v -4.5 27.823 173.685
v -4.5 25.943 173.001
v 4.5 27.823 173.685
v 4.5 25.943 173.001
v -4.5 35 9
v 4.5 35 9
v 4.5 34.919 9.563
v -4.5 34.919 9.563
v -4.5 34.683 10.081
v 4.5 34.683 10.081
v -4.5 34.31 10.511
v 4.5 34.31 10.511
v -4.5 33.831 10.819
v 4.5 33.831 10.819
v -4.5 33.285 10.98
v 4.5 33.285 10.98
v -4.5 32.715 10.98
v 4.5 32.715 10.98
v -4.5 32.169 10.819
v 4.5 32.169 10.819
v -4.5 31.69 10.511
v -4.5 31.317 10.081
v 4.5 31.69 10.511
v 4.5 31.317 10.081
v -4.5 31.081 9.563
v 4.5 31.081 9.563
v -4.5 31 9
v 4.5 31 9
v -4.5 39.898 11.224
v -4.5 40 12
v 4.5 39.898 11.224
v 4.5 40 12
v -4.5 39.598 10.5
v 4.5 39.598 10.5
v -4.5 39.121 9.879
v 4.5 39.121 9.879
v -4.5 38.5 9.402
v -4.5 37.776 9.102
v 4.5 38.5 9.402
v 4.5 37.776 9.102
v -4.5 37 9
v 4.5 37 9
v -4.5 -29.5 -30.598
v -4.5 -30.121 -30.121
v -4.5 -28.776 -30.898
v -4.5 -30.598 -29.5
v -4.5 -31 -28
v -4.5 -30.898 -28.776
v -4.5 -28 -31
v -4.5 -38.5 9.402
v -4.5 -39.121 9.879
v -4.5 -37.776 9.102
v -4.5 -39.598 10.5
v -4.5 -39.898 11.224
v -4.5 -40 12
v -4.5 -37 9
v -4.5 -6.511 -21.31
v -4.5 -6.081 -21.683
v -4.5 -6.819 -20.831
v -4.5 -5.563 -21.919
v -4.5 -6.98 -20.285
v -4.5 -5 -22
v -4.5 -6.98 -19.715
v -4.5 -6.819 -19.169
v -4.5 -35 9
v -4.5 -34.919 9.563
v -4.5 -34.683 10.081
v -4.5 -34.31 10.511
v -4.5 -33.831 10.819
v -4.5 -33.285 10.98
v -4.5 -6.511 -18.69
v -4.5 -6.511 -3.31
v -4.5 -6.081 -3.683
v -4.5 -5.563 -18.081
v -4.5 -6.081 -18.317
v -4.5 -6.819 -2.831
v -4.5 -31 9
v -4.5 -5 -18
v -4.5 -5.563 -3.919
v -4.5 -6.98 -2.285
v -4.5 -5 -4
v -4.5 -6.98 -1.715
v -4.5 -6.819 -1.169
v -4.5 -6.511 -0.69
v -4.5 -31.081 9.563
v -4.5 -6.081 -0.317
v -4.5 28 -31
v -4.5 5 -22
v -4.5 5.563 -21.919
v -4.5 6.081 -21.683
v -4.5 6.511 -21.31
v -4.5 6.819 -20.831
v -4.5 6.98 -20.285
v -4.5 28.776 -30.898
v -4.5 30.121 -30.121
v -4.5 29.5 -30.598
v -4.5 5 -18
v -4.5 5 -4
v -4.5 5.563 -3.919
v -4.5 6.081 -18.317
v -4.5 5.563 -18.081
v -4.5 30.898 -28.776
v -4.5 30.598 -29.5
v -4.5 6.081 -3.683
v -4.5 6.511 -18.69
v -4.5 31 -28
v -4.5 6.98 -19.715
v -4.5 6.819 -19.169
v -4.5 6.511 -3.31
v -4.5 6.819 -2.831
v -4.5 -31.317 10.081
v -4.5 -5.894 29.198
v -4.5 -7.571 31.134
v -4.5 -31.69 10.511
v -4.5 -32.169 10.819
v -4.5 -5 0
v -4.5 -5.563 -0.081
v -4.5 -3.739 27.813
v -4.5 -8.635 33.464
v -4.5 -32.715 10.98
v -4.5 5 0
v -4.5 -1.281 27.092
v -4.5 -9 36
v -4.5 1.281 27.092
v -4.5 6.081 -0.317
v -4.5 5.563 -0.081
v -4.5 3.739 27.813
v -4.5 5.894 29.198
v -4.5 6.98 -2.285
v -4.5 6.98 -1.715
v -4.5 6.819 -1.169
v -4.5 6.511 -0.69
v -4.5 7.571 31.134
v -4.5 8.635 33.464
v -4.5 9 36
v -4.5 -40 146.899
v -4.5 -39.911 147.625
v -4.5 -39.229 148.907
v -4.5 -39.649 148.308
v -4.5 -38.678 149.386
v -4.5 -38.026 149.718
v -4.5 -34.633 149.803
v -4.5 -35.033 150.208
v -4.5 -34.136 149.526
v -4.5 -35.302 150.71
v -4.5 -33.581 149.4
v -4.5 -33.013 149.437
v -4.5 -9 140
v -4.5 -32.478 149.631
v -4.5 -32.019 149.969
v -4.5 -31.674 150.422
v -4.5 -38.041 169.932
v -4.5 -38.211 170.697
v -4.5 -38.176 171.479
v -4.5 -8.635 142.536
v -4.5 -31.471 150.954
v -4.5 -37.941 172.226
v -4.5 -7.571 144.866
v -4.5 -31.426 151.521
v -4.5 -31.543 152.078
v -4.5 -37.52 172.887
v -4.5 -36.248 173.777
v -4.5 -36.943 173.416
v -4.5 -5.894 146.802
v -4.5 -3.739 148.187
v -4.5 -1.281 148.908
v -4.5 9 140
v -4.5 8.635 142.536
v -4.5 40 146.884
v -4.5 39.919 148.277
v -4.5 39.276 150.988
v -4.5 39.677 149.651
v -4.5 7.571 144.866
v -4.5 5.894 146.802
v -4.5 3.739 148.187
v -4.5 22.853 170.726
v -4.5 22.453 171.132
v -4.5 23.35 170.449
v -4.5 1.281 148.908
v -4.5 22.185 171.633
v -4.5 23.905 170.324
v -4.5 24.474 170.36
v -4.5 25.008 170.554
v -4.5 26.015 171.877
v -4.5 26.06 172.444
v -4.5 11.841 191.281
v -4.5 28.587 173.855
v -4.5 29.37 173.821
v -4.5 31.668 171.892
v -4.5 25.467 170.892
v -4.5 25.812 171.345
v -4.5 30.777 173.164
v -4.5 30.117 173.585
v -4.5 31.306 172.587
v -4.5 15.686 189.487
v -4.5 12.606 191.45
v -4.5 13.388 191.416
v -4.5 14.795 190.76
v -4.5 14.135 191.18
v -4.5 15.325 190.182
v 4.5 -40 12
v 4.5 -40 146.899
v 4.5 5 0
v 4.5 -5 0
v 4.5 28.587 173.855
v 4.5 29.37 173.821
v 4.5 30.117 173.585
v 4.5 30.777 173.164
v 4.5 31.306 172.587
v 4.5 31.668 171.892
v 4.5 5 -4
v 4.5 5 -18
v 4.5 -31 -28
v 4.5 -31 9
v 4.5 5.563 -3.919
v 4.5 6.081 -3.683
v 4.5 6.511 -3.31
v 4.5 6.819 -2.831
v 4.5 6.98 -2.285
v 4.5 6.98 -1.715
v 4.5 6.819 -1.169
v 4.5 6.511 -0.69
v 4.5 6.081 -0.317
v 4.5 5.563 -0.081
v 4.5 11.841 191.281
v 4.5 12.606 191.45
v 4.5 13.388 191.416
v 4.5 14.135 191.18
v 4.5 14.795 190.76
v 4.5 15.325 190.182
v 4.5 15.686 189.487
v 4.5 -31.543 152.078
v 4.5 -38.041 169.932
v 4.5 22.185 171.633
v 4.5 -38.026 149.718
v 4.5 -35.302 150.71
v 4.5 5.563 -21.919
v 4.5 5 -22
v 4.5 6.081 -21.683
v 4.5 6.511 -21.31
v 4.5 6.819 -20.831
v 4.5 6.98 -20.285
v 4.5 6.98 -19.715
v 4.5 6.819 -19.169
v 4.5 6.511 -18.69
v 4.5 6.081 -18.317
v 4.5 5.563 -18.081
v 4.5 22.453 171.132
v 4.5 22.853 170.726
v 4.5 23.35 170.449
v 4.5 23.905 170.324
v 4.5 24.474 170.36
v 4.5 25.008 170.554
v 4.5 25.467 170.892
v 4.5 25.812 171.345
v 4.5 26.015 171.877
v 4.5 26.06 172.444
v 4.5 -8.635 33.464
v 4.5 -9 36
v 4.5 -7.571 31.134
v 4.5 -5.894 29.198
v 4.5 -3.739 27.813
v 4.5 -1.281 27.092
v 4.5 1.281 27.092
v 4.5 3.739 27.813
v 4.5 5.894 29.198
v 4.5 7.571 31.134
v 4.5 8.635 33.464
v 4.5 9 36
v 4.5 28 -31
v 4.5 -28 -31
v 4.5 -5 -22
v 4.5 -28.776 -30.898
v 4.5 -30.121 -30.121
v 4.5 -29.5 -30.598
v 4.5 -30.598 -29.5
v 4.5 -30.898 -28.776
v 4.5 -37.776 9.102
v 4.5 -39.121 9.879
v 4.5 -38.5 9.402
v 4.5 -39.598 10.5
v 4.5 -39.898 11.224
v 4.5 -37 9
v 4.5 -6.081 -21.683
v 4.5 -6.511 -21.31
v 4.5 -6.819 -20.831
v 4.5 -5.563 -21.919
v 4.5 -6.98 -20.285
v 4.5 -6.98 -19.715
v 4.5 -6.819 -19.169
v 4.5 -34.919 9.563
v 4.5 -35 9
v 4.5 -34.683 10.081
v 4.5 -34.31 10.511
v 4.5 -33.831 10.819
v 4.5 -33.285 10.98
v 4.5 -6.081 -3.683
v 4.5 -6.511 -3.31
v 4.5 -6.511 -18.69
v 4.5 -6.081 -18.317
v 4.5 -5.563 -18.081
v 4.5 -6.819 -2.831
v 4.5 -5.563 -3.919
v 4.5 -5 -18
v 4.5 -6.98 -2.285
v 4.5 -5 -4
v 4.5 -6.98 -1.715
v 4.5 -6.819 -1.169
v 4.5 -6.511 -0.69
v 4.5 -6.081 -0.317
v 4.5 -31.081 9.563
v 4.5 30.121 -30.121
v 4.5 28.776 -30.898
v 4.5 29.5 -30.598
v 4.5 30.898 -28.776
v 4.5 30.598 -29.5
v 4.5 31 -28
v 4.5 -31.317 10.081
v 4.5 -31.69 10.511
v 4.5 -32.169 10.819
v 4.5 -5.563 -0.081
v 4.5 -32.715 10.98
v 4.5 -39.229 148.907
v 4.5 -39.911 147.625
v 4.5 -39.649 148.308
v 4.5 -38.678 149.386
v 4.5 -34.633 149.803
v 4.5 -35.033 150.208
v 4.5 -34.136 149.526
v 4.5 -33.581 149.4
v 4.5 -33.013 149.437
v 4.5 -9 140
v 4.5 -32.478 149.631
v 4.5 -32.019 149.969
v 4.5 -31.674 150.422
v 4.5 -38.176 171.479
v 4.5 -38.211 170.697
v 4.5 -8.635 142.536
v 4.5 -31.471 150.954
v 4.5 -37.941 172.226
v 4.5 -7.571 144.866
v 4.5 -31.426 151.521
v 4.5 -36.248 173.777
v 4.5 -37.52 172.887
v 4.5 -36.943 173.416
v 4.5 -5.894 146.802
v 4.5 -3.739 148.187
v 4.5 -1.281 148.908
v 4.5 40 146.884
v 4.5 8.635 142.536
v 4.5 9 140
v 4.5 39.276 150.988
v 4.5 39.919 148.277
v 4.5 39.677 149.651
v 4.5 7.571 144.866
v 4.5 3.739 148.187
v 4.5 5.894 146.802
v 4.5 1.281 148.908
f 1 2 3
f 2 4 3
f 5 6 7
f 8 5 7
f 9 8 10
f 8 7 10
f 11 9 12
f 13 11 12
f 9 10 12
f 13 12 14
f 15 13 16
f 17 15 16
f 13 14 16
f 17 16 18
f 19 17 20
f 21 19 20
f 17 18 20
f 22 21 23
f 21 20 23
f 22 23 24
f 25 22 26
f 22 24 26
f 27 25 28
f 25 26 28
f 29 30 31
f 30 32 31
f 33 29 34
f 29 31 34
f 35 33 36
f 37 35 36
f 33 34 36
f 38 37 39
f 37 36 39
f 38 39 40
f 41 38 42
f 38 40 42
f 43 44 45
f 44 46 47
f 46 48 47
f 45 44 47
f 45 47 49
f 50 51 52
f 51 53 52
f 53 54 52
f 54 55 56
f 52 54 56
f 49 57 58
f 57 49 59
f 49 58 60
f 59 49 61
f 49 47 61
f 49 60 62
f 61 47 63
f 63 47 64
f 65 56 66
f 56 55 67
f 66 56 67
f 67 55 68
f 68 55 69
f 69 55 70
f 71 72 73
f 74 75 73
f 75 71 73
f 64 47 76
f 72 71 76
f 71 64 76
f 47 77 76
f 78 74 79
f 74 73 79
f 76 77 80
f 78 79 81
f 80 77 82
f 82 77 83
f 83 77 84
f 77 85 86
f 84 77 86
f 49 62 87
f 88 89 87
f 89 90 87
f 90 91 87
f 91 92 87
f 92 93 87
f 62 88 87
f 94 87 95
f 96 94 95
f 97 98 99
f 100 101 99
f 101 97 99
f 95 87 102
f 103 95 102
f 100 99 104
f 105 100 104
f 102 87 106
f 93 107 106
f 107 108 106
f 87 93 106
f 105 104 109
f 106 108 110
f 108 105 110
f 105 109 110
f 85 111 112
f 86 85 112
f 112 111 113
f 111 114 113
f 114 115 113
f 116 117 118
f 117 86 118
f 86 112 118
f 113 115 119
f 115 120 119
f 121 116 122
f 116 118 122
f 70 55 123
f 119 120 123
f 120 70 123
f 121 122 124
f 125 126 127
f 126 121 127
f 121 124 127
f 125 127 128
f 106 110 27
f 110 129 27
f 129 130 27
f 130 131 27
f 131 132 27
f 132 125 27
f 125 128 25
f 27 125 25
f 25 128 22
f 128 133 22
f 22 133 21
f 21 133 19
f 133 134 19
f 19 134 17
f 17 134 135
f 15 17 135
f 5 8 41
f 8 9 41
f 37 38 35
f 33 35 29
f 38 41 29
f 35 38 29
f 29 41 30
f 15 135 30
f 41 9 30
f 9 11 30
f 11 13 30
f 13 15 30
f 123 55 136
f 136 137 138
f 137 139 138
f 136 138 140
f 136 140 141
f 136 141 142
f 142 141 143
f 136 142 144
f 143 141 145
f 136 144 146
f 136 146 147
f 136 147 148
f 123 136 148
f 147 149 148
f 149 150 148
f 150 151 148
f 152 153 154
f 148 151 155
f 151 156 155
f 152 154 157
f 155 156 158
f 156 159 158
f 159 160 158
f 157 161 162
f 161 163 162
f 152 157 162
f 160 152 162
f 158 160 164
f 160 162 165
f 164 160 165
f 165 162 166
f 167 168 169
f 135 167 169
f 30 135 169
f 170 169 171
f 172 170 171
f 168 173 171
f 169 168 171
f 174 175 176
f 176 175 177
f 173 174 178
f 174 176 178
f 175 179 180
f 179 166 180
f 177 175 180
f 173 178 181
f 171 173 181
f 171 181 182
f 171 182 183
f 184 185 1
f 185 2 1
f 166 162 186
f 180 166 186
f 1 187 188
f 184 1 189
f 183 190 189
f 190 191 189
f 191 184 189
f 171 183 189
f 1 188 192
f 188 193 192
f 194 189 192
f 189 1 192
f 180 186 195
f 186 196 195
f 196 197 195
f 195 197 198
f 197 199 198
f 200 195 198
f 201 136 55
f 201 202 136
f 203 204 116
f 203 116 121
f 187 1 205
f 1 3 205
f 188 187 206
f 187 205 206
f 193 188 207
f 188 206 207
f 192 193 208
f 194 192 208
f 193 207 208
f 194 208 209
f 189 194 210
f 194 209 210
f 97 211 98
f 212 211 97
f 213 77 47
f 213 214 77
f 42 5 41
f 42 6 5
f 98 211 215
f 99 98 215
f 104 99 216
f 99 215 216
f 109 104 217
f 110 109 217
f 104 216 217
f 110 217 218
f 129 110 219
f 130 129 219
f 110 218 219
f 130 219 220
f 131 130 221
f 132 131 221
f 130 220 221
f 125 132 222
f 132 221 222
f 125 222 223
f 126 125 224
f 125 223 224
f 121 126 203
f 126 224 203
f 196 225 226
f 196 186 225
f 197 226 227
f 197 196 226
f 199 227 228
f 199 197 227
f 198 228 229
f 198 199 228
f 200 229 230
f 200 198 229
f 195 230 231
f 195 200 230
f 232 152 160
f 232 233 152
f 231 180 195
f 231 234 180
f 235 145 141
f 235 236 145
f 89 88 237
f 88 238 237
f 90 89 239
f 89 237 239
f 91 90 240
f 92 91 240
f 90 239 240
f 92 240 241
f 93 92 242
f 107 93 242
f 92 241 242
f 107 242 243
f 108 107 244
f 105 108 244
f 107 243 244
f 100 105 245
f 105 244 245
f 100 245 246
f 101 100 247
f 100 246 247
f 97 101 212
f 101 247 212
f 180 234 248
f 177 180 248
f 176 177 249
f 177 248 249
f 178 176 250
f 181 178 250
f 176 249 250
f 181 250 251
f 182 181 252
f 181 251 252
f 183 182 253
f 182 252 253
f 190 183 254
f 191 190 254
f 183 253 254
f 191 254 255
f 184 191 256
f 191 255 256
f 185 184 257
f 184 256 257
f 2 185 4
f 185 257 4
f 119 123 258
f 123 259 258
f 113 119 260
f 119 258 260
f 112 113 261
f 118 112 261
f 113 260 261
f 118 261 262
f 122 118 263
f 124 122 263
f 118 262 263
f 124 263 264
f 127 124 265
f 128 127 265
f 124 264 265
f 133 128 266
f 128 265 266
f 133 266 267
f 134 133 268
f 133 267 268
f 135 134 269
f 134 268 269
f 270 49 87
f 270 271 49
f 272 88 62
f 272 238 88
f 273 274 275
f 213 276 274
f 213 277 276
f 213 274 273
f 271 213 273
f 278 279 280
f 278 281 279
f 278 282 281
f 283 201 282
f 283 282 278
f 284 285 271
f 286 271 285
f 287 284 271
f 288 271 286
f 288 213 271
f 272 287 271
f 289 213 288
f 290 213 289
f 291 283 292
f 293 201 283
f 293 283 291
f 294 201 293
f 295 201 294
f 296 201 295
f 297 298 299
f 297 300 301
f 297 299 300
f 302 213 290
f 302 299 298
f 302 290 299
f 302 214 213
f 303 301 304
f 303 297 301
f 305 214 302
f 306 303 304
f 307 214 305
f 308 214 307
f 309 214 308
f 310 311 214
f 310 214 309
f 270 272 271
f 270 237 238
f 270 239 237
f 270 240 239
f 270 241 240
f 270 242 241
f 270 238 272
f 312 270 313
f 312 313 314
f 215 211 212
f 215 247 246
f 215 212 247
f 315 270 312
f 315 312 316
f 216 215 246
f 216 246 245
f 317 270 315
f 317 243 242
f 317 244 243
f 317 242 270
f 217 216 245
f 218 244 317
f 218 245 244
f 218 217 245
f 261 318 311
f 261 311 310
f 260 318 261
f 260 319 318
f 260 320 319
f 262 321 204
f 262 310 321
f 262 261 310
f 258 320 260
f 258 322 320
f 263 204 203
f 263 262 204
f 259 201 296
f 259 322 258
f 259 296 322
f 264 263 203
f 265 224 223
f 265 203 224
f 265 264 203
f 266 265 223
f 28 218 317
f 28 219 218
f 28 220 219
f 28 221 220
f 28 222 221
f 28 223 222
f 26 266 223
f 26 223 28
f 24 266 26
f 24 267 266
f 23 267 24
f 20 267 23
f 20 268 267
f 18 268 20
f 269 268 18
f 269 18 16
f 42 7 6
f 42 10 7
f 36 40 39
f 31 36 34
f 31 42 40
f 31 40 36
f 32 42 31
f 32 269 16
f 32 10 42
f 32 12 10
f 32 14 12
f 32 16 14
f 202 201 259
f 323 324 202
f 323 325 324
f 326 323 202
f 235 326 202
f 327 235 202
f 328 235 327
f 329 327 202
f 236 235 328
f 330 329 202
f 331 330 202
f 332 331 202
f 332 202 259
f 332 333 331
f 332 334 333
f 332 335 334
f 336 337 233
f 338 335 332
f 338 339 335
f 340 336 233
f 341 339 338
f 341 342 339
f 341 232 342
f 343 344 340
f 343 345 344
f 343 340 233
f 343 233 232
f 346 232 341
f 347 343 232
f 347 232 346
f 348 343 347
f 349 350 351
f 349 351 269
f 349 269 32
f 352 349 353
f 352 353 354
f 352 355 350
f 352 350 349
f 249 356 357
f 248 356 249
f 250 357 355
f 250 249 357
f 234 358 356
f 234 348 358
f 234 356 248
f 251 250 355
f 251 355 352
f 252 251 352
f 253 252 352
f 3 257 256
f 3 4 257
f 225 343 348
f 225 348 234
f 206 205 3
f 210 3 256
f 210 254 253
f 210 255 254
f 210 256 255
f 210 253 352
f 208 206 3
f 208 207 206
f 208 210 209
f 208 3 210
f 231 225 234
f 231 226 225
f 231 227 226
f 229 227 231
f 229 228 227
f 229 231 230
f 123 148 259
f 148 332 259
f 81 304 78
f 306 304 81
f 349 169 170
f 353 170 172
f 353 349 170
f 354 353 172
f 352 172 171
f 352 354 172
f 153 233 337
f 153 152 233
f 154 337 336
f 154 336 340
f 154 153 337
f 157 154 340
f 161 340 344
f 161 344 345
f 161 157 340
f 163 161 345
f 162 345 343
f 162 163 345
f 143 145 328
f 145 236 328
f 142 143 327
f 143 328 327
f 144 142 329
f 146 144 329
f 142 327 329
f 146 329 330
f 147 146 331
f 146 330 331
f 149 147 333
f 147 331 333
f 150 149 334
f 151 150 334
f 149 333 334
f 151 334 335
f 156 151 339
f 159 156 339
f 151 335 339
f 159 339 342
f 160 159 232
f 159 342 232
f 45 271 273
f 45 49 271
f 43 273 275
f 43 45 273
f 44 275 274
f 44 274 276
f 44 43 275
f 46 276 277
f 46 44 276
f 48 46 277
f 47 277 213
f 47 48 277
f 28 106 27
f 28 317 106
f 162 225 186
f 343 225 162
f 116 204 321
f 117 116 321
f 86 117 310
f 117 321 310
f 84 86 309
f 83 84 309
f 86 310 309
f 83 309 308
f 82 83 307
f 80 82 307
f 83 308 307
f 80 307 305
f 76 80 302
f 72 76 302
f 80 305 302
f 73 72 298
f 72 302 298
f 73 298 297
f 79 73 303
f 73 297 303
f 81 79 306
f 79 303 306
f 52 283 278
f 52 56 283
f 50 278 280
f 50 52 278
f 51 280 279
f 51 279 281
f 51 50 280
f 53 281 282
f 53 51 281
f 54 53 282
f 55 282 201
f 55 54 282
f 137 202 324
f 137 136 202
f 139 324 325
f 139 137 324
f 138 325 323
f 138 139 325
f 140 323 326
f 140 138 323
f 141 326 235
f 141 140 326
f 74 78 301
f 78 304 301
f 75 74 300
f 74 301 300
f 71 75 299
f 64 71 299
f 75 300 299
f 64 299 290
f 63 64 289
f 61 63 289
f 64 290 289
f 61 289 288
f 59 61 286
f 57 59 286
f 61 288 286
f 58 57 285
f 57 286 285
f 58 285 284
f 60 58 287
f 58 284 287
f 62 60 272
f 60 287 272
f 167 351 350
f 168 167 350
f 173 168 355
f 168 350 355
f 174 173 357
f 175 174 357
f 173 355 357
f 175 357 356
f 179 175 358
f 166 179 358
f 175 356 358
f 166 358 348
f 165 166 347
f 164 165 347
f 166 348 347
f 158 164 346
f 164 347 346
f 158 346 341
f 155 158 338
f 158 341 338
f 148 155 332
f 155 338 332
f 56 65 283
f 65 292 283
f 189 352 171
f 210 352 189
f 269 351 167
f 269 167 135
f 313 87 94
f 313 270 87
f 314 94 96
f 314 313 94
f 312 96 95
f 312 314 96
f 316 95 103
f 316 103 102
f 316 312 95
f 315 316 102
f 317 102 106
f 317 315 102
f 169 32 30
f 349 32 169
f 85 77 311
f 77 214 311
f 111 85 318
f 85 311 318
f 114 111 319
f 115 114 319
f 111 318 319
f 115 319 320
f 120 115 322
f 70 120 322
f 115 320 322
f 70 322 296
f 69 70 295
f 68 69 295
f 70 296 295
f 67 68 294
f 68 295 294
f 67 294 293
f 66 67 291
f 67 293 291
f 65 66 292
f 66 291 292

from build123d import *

# Parameters (mm, degrees)
PAD001_DEPTH = 4.5
FILLET_R     = 3
FILLET010_R  = 12


with BuildPart() as part:
    # Sketch001 → Pad001 (new body, symmetric)
    with BuildSketch(Plane.YZ):
        with BuildLine():
            Line((-31, -31), (31, -31))
            Line((31, -31), (31, 9))
            ThreePointArc((35, 9), (33, 11), (31, 9))
            Line((35, 9), (40, 9))
            Line((40, 9), (40, 149))
            Line((40, 149), (30.6417777248, 174.7115043875))
            Line((25.9433146208, 173.0014036708), (30.6417777248, 174.7115043875))
            ThreePointArc((22.1845441377, 171.6333230975), (24.7479696659, 170.4379781426), (25.9433146208, 173.0014036708))
            Line((22.1845441377, 171.6333230975), (14.6601009845, 192.3065607548))
            Line((14.6601009845, 192.3065607548), (-39.0672095661, 172.7514189472))
            Line((-39.0672095661, 172.7514189472), (-31.5427664129, 152.0781812899))
            ThreePointArc((-35.3015368961, 150.7101007166), (-32.7381113678, 149.5147557617), (-31.5427664129, 152.0781812899))
            Line((-35.3015368961, 150.7101007166), (-40, 149))
            Line((-40, 149), (-40, 9))
            Line((-35, 9), (-40, 9))
            ThreePointArc((-31, 9), (-33, 11), (-35, 9))
            Line((-31, 9), (-31, -31))
        make_face()
        with BuildLine():
            Line((-5, 0), (5, 0))
            ThreePointArc((5, -4), (7, -2), (5, 0))
            Line((5, -4), (5, -18))
            ThreePointArc((5, -22), (7, -20), (5, -18))
            Line((5, -22), (-5, -22))
            ThreePointArc((-5, -18), (-7, -20), (-5, -22))
            Line((-5, -18), (-5, -4))
            ThreePointArc((-5, 0), (-7, -2), (-5, -4))
        make_face(mode=Mode.SUBTRACT)
        with BuildLine():
            ThreePointArc((9, 140), (0, 149), (-9, 140))
            Line((-9, 140), (-9, 36))
            ThreePointArc((-9, 36), (0, 27), (9, 36))
            Line((9, 140), (9, 36))
        make_face(mode=Mode.SUBTRACT)
    extrude(amount=PAD001_DEPTH, both=True)

    # Fillet
    fillet_edges = [part.edges().sort_by_distance(p)[0] for p in [
        (0, 30.641778, 174.711504),
        (0, -40, 149),
        (0, -40, 9),
        (0, 40, 9),
        (0, 31, -31),
        (0, -31, -31),
        (0, -39.06721, 172.751419),
        (0, 14.660101, 192.306561),
    ]]
    fillet(fillet_edges, radius=FILLET_R)

    # Fillet010
    fillet010_edges = [part.edges().sort_by_distance(p)[0] for p in [
        (0, 40, 149),
    ]]
    fillet(fillet010_edges, radius=FILLET010_R)


solid = part.part
